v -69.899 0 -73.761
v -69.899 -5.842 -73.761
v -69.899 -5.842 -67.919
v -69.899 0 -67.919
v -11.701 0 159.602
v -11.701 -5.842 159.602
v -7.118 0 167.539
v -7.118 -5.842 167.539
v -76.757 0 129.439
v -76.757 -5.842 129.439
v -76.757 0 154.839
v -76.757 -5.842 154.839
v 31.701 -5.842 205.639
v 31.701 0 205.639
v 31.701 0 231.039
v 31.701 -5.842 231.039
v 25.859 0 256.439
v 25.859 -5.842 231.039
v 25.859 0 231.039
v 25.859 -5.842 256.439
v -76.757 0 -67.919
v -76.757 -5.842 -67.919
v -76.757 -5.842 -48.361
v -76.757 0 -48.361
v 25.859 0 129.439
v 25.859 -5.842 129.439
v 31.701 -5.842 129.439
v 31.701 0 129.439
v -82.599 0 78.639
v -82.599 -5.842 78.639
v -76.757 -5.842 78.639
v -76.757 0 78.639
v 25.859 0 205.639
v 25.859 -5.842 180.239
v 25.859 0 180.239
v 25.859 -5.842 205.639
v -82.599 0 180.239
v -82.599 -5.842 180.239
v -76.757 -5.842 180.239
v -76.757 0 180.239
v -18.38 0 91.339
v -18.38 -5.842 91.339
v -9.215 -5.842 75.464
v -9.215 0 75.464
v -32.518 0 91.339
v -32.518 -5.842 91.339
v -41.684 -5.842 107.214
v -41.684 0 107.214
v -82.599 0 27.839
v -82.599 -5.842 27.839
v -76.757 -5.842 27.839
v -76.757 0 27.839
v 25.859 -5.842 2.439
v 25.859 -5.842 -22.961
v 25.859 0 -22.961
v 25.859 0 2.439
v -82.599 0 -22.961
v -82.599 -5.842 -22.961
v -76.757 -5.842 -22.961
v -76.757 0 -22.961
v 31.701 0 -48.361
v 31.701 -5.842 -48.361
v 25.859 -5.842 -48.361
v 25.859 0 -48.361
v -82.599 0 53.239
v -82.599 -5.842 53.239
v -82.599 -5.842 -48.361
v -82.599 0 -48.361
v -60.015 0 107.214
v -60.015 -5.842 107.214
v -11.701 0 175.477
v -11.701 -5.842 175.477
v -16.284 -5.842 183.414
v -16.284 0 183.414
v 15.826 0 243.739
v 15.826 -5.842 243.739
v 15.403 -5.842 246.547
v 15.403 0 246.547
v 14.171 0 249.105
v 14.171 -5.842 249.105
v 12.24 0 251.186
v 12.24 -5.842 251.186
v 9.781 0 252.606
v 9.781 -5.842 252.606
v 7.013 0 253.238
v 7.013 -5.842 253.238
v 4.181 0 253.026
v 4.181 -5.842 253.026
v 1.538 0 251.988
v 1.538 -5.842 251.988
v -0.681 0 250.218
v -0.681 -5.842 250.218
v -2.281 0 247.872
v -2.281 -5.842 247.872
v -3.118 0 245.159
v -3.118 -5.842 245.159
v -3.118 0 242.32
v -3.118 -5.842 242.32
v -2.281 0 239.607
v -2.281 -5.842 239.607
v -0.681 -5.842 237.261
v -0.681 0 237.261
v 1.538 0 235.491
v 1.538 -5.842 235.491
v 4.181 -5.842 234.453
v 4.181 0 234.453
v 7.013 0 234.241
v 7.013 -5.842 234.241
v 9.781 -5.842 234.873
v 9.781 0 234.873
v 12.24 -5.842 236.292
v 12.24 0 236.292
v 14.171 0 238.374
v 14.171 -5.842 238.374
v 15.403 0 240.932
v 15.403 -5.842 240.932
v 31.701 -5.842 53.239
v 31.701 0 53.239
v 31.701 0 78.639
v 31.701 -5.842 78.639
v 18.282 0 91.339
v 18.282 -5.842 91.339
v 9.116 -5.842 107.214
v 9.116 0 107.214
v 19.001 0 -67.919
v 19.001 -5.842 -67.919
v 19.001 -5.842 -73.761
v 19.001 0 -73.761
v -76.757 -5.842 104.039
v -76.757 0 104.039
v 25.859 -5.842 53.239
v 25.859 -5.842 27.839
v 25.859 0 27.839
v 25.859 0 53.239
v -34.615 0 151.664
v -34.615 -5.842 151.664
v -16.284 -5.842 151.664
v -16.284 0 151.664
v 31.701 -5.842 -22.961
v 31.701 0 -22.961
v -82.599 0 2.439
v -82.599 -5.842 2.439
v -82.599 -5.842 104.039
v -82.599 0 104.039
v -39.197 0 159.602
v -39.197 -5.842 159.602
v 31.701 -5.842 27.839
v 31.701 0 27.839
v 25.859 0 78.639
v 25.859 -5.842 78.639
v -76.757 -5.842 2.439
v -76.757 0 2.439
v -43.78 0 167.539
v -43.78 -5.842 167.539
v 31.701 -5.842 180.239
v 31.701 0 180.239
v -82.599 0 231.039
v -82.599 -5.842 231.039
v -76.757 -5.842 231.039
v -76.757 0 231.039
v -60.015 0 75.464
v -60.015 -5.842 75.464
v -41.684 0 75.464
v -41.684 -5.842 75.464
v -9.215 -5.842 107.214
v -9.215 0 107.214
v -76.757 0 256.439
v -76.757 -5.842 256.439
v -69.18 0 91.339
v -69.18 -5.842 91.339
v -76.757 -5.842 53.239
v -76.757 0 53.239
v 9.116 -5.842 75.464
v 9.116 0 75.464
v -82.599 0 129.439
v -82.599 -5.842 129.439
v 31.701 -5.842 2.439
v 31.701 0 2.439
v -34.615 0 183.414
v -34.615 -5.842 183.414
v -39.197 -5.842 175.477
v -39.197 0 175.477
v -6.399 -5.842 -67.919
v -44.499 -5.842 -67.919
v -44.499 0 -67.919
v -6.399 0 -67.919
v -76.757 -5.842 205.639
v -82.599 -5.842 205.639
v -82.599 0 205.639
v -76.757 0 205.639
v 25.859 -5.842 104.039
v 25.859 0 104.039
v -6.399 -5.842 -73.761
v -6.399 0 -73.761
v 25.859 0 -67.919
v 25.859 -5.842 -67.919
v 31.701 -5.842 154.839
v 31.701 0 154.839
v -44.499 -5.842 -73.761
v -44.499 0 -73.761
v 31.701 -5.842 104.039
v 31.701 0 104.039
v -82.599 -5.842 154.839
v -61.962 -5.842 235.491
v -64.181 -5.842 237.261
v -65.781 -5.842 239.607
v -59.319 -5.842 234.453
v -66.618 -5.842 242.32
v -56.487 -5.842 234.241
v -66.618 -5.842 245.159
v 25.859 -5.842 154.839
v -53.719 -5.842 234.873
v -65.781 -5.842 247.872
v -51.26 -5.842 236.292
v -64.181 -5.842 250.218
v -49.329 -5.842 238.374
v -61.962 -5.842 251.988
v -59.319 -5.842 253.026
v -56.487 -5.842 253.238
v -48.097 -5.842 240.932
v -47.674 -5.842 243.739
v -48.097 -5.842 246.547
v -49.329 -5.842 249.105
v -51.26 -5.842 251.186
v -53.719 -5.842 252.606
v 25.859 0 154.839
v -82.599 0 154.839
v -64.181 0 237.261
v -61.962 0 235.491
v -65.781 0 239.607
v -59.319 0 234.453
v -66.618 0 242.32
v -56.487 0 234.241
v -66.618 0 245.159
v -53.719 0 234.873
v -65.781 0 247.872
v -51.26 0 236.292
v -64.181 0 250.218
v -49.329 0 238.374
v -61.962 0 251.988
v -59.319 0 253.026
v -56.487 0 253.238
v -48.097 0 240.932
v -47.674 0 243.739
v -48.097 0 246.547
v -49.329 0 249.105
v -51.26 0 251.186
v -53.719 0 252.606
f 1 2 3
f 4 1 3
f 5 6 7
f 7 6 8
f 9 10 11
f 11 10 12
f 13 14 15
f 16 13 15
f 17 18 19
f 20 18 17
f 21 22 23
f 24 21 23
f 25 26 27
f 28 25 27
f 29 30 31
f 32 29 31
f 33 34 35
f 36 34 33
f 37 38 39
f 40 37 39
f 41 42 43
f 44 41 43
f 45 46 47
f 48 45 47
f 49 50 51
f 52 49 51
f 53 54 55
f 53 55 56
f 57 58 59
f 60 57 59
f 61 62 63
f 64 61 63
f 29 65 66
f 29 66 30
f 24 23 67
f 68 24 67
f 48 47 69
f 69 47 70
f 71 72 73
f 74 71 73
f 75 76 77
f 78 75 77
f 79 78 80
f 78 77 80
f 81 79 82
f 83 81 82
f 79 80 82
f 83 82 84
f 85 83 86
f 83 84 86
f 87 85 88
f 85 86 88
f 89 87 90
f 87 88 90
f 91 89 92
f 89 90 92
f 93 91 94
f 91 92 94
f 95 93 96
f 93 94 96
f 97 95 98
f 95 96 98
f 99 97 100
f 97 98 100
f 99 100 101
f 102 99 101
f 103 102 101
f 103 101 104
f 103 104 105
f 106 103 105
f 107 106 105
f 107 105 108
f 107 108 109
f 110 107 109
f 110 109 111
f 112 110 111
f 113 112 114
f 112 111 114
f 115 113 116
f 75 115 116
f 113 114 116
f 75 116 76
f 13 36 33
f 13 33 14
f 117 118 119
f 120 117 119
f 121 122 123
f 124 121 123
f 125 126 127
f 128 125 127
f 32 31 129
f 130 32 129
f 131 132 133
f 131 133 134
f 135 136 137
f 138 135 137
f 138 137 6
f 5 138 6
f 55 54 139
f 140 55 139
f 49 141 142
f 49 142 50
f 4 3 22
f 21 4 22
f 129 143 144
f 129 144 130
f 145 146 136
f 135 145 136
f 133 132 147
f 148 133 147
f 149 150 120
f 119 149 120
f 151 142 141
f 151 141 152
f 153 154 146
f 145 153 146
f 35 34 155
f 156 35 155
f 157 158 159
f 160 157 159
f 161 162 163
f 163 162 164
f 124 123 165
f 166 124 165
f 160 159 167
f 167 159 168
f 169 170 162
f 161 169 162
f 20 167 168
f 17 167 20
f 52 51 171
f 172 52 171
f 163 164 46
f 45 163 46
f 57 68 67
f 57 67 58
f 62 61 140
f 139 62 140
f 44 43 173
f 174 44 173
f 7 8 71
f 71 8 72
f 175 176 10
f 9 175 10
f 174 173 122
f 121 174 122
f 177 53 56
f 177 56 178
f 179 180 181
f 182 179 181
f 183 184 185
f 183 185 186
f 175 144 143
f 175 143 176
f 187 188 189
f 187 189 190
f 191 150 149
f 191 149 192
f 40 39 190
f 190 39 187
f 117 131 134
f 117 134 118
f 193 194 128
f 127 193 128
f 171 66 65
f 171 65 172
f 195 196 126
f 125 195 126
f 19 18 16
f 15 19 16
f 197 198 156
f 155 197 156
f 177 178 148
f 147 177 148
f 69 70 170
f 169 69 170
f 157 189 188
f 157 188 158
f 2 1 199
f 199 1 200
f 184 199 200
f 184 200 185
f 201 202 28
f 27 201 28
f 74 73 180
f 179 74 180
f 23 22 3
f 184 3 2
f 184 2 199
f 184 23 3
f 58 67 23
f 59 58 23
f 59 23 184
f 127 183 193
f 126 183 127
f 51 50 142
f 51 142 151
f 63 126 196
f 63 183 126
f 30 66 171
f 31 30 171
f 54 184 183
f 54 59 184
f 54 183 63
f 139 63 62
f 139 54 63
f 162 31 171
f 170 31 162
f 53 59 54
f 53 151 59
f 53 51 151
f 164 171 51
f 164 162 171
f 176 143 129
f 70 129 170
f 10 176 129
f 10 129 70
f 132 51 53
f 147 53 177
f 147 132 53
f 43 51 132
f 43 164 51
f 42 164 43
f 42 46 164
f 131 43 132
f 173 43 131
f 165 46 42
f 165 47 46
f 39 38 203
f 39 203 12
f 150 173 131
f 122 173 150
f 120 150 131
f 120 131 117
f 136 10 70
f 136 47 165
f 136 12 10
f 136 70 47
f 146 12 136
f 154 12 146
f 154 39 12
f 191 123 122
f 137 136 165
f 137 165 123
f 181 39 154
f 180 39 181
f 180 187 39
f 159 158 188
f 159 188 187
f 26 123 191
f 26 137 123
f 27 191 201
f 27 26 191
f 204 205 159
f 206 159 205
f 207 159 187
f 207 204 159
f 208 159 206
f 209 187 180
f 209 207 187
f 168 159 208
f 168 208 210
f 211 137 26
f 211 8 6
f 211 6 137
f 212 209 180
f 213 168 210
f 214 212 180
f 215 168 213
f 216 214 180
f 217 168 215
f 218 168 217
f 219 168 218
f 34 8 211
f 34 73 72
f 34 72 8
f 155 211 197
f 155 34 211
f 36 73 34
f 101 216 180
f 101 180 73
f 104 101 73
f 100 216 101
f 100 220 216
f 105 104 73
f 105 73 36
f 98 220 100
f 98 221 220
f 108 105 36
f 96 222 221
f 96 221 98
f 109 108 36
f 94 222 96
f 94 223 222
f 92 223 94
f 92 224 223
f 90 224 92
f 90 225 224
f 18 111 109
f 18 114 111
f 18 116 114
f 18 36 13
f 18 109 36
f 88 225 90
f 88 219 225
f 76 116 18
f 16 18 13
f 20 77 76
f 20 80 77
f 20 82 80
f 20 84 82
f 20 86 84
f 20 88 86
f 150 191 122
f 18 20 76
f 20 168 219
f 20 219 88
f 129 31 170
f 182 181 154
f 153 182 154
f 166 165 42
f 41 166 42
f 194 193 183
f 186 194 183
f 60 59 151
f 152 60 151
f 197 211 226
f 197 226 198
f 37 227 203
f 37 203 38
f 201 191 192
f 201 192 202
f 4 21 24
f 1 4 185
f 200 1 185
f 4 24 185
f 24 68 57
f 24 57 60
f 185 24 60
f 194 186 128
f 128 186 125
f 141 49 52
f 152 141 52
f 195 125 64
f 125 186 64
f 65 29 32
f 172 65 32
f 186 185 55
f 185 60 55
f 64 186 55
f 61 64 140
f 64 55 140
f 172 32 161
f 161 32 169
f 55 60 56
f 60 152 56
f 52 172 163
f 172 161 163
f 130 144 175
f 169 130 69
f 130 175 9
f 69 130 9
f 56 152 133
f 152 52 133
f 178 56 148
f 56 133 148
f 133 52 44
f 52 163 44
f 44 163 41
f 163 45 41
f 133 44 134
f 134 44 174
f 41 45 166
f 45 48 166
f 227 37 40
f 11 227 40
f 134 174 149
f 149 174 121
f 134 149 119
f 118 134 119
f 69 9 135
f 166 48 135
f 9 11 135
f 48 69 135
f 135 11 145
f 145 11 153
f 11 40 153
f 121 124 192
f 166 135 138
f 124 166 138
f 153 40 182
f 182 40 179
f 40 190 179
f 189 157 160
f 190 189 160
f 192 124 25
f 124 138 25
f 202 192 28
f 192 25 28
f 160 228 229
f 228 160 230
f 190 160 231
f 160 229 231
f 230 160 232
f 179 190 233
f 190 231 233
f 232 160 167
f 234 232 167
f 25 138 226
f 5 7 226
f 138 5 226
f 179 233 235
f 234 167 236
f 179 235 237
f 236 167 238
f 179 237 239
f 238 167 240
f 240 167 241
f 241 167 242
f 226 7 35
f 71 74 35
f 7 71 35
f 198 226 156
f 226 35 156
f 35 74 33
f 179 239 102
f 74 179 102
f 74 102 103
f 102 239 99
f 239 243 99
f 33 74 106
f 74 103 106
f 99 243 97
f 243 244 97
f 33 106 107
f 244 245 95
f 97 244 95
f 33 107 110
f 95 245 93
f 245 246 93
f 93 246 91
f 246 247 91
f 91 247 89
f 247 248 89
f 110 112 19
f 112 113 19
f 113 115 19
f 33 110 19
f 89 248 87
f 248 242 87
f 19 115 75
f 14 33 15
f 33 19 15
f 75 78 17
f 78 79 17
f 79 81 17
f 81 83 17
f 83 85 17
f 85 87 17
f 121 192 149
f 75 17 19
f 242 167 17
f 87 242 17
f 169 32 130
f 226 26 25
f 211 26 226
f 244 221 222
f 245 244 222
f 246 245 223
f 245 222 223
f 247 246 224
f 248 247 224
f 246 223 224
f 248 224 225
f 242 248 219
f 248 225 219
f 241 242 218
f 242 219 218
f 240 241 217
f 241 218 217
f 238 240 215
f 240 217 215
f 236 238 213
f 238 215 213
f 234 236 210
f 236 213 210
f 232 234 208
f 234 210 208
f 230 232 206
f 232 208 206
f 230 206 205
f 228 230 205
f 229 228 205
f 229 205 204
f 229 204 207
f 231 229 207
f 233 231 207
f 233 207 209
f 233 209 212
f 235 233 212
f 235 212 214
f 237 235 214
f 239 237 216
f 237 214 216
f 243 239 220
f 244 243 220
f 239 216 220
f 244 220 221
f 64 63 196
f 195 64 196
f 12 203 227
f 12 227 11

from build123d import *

# Parameters (mm, degrees)
F0_W     = 114.3
F0_H     = 330.2
F1_DEPTH = 5.842
F2_W     = 38.1
F2_H     = 5.842
F2_W_2   = 5.842
F2_H_2   = 25.4
F3_DEPTH = 25.4
F4_R     = 9.525
F5_DEPTH = 5.842


# Not quite as in the source:
# - a feature names something its author has since deleted; it is built from what else it names


with BuildPart() as f1:
    # F0 (on Front) → F1 (new body)
    with BuildSketch(Plane.XZ):
        with Locations((-25.4490938969, 91.3394362139)):
            Rectangle(F0_W, F0_H)
    extrude(amount=F1_DEPTH)

    # F2 (on face) → F3 (cut)
    with BuildSketch(Plane.XZ.offset(5.842)):
        Polygon((-82.5990938969, -73.7605637861), (-69.8990938969, -73.7605637861), (-69.8990938969, -67.9185637861), (-76.7570938969, -67.9185637861), (-76.7570938969, -48.3605637861), (-82.5990938969, -48.3605637861), align=None)
        with Locations((-25.4490938969, -70.8395637861)):
            Rectangle(F2_W, F2_H)
        Polygon((19.0009061031, -67.9185637861), (19.0009061031, -73.7605637861), (31.7009061031, -73.7605637861), (31.7009061031, -48.3605637861), (25.8589061031, -48.3605637861), (25.8589061031, -67.9185637861), align=None)
        with Locations((-79.6780938969, -10.2605637861)):
            Rectangle(F2_W_2, F2_H_2)
        with Locations((28.7799061031, -10.2605637861)):
            Rectangle(F2_W_2, F2_H_2)
        with Locations((-79.6780938969, 40.5394362139)):
            Rectangle(F2_W_2, F2_H_2)
        with Locations((28.7799061031, 40.5394362139)):
            Rectangle(F2_W_2, F2_H_2)
        with Locations((-79.6780938969, 91.3394362139)):
            Rectangle(F2_W_2, F2_H_2)
        with Locations((28.7799061031, 91.3394362139)):
            Rectangle(F2_W_2, F2_H_2)
        with Locations((-79.6780938969, 142.1394362139)):
            Rectangle(F2_W_2, F2_H_2)
        with Locations((28.7799061031, 142.1394362139)):
            Rectangle(F2_W_2, F2_H_2)
        with Locations((-79.6780938969, 192.9394362139)):
            Rectangle(F2_W_2, F2_H_2)
        with Locations((28.7799061031, 192.9394362139)):
            Rectangle(F2_W_2, F2_H_2)
        with Locations((28.7799061031, 243.7394362139)):
            Rectangle(F2_W_2, F2_H_2)
        with Locations((-79.6780938969, 243.7394362139)):
            Rectangle(F2_W_2, F2_H_2)
    extrude(amount=-F3_DEPTH, mode=Mode.SUBTRACT)

    # F4 (on face) → F5 (cut, through all)
    with BuildSketch(Plane.XZ.offset(5.842)):
        with BuildLine():
            ThreePointArc((-11.7009406501, 159.6019361475), (-10.1150214145, 163.4306838358), (-9.5740938969, 167.5394362139))
            ThreePointArc((-9.5740938969, 167.5394362139), (-10.1150214004, 171.6481885393), (-11.7009405957, 175.4769361859))
            ThreePointArc((-11.7009405957, 175.4769361859), (-17.5115938829, 181.2875894909), (-25.4490938969, 183.4144362139))
            ThreePointArc((-25.4490938969, 183.4144362139), (-33.3865937403, 181.2875895894), (-39.1972470011, 175.4769365272))
            ThreePointArc((-39.1972470011, 175.4769365272), (-41.3240938969, 167.5394362139), (-39.1972470011, 159.6019359006))
            ThreePointArc((-39.1972470011, 159.6019359006), (-33.3865937403, 153.7912828383), (-25.4490938969, 151.6644362139))
            ThreePointArc((-25.4490938969, 151.6644362139), (-17.5115939301, 153.7912829096), (-11.7009406501, 159.6019361475))
        make_face()
        with Locations((-57.1990938969, 243.7394362139)):
            Circle(F4_R)
        with Locations((6.3009061031, 243.7394362139)):
            Circle(F4_R)
        Polygon((-32.5182228501, 91.3394362139), (-41.6836583735, 107.2144362139), (-60.0145294203, 107.2144362139), (-69.1799649437, 91.3394362139), (-60.0145294203, 75.4644362139), (-41.6836583735, 75.4644362139), align=None)
        Polygon((18.2817771499, 91.3394362139), (9.1163416265, 107.2144362139), (-9.2145294203, 107.2144362139), (-18.3799649437, 91.3394362139), (-9.2145294203, 75.4644362139), (9.1163416265, 75.4644362139), align=None)
        with BuildLine():
            ThreePointArc((-39.1972470011, 175.4769365272), (-33.3865937403, 181.2875895894), (-25.4490938969, 183.4144362139))
            Line((-25.4490938969, 183.4144362139), (-34.6145294203, 183.4144362139))
            Line((-34.6145294203, 183.4144362139), (-39.1972470011, 175.4769365272))
        make_face()
        with BuildLine():
            ThreePointArc((-25.4490938969, 183.4144362139), (-17.5115938829, 181.2875894909), (-11.7009405957, 175.4769361859))
            Line((-11.7009405957, 175.4769361859), (-16.2836583735, 183.4144362139))
            Line((-16.2836583735, 183.4144362139), (-25.4490938969, 183.4144362139))
        make_face()
        with BuildLine():
            ThreePointArc((-11.7009405957, 175.4769361859), (-10.1150214004, 171.6481885393), (-9.5740938969, 167.5394362139))
            ThreePointArc((-9.5740938969, 167.5394362139), (-10.1150214145, 163.4306838358), (-11.7009406501, 159.6019361475))
            Line((-11.7009406501, 159.6019361475), (-7.1182228501, 167.5394362139))
            Line((-7.1182228501, 167.5394362139), (-11.7009405957, 175.4769361859))
        make_face()
        with BuildLine():
            Line((-16.2836583735, 151.6644362139), (-11.7009406501, 159.6019361475))
            ThreePointArc((-11.7009406501, 159.6019361475), (-17.5115939301, 153.7912829096), (-25.4490938969, 151.6644362139))
            Line((-25.4490938969, 151.6644362139), (-16.2836583735, 151.6644362139))
        make_face()
        with BuildLine():
            Line((-34.6145294203, 151.6644362139), (-25.4490938969, 151.6644362139))
            ThreePointArc((-25.4490938969, 151.6644362139), (-33.3865937403, 153.7912828383), (-39.1972470011, 159.6019359006))
            Line((-39.1972470011, 159.6019359006), (-34.6145294203, 151.6644362139))
        make_face()
        with BuildLine():
            ThreePointArc((-39.1972470011, 159.6019359006), (-41.3240938969, 167.5394362139), (-39.1972470011, 175.4769365272))
            Line((-39.1972470011, 175.4769365272), (-43.7799649437, 167.5394362139))
            Line((-43.7799649437, 167.5394362139), (-39.1972470011, 159.6019359006))
        make_face()
    extrude(amount=-F5_DEPTH, mode=Mode.SUBTRACT)


solid = f1.part
